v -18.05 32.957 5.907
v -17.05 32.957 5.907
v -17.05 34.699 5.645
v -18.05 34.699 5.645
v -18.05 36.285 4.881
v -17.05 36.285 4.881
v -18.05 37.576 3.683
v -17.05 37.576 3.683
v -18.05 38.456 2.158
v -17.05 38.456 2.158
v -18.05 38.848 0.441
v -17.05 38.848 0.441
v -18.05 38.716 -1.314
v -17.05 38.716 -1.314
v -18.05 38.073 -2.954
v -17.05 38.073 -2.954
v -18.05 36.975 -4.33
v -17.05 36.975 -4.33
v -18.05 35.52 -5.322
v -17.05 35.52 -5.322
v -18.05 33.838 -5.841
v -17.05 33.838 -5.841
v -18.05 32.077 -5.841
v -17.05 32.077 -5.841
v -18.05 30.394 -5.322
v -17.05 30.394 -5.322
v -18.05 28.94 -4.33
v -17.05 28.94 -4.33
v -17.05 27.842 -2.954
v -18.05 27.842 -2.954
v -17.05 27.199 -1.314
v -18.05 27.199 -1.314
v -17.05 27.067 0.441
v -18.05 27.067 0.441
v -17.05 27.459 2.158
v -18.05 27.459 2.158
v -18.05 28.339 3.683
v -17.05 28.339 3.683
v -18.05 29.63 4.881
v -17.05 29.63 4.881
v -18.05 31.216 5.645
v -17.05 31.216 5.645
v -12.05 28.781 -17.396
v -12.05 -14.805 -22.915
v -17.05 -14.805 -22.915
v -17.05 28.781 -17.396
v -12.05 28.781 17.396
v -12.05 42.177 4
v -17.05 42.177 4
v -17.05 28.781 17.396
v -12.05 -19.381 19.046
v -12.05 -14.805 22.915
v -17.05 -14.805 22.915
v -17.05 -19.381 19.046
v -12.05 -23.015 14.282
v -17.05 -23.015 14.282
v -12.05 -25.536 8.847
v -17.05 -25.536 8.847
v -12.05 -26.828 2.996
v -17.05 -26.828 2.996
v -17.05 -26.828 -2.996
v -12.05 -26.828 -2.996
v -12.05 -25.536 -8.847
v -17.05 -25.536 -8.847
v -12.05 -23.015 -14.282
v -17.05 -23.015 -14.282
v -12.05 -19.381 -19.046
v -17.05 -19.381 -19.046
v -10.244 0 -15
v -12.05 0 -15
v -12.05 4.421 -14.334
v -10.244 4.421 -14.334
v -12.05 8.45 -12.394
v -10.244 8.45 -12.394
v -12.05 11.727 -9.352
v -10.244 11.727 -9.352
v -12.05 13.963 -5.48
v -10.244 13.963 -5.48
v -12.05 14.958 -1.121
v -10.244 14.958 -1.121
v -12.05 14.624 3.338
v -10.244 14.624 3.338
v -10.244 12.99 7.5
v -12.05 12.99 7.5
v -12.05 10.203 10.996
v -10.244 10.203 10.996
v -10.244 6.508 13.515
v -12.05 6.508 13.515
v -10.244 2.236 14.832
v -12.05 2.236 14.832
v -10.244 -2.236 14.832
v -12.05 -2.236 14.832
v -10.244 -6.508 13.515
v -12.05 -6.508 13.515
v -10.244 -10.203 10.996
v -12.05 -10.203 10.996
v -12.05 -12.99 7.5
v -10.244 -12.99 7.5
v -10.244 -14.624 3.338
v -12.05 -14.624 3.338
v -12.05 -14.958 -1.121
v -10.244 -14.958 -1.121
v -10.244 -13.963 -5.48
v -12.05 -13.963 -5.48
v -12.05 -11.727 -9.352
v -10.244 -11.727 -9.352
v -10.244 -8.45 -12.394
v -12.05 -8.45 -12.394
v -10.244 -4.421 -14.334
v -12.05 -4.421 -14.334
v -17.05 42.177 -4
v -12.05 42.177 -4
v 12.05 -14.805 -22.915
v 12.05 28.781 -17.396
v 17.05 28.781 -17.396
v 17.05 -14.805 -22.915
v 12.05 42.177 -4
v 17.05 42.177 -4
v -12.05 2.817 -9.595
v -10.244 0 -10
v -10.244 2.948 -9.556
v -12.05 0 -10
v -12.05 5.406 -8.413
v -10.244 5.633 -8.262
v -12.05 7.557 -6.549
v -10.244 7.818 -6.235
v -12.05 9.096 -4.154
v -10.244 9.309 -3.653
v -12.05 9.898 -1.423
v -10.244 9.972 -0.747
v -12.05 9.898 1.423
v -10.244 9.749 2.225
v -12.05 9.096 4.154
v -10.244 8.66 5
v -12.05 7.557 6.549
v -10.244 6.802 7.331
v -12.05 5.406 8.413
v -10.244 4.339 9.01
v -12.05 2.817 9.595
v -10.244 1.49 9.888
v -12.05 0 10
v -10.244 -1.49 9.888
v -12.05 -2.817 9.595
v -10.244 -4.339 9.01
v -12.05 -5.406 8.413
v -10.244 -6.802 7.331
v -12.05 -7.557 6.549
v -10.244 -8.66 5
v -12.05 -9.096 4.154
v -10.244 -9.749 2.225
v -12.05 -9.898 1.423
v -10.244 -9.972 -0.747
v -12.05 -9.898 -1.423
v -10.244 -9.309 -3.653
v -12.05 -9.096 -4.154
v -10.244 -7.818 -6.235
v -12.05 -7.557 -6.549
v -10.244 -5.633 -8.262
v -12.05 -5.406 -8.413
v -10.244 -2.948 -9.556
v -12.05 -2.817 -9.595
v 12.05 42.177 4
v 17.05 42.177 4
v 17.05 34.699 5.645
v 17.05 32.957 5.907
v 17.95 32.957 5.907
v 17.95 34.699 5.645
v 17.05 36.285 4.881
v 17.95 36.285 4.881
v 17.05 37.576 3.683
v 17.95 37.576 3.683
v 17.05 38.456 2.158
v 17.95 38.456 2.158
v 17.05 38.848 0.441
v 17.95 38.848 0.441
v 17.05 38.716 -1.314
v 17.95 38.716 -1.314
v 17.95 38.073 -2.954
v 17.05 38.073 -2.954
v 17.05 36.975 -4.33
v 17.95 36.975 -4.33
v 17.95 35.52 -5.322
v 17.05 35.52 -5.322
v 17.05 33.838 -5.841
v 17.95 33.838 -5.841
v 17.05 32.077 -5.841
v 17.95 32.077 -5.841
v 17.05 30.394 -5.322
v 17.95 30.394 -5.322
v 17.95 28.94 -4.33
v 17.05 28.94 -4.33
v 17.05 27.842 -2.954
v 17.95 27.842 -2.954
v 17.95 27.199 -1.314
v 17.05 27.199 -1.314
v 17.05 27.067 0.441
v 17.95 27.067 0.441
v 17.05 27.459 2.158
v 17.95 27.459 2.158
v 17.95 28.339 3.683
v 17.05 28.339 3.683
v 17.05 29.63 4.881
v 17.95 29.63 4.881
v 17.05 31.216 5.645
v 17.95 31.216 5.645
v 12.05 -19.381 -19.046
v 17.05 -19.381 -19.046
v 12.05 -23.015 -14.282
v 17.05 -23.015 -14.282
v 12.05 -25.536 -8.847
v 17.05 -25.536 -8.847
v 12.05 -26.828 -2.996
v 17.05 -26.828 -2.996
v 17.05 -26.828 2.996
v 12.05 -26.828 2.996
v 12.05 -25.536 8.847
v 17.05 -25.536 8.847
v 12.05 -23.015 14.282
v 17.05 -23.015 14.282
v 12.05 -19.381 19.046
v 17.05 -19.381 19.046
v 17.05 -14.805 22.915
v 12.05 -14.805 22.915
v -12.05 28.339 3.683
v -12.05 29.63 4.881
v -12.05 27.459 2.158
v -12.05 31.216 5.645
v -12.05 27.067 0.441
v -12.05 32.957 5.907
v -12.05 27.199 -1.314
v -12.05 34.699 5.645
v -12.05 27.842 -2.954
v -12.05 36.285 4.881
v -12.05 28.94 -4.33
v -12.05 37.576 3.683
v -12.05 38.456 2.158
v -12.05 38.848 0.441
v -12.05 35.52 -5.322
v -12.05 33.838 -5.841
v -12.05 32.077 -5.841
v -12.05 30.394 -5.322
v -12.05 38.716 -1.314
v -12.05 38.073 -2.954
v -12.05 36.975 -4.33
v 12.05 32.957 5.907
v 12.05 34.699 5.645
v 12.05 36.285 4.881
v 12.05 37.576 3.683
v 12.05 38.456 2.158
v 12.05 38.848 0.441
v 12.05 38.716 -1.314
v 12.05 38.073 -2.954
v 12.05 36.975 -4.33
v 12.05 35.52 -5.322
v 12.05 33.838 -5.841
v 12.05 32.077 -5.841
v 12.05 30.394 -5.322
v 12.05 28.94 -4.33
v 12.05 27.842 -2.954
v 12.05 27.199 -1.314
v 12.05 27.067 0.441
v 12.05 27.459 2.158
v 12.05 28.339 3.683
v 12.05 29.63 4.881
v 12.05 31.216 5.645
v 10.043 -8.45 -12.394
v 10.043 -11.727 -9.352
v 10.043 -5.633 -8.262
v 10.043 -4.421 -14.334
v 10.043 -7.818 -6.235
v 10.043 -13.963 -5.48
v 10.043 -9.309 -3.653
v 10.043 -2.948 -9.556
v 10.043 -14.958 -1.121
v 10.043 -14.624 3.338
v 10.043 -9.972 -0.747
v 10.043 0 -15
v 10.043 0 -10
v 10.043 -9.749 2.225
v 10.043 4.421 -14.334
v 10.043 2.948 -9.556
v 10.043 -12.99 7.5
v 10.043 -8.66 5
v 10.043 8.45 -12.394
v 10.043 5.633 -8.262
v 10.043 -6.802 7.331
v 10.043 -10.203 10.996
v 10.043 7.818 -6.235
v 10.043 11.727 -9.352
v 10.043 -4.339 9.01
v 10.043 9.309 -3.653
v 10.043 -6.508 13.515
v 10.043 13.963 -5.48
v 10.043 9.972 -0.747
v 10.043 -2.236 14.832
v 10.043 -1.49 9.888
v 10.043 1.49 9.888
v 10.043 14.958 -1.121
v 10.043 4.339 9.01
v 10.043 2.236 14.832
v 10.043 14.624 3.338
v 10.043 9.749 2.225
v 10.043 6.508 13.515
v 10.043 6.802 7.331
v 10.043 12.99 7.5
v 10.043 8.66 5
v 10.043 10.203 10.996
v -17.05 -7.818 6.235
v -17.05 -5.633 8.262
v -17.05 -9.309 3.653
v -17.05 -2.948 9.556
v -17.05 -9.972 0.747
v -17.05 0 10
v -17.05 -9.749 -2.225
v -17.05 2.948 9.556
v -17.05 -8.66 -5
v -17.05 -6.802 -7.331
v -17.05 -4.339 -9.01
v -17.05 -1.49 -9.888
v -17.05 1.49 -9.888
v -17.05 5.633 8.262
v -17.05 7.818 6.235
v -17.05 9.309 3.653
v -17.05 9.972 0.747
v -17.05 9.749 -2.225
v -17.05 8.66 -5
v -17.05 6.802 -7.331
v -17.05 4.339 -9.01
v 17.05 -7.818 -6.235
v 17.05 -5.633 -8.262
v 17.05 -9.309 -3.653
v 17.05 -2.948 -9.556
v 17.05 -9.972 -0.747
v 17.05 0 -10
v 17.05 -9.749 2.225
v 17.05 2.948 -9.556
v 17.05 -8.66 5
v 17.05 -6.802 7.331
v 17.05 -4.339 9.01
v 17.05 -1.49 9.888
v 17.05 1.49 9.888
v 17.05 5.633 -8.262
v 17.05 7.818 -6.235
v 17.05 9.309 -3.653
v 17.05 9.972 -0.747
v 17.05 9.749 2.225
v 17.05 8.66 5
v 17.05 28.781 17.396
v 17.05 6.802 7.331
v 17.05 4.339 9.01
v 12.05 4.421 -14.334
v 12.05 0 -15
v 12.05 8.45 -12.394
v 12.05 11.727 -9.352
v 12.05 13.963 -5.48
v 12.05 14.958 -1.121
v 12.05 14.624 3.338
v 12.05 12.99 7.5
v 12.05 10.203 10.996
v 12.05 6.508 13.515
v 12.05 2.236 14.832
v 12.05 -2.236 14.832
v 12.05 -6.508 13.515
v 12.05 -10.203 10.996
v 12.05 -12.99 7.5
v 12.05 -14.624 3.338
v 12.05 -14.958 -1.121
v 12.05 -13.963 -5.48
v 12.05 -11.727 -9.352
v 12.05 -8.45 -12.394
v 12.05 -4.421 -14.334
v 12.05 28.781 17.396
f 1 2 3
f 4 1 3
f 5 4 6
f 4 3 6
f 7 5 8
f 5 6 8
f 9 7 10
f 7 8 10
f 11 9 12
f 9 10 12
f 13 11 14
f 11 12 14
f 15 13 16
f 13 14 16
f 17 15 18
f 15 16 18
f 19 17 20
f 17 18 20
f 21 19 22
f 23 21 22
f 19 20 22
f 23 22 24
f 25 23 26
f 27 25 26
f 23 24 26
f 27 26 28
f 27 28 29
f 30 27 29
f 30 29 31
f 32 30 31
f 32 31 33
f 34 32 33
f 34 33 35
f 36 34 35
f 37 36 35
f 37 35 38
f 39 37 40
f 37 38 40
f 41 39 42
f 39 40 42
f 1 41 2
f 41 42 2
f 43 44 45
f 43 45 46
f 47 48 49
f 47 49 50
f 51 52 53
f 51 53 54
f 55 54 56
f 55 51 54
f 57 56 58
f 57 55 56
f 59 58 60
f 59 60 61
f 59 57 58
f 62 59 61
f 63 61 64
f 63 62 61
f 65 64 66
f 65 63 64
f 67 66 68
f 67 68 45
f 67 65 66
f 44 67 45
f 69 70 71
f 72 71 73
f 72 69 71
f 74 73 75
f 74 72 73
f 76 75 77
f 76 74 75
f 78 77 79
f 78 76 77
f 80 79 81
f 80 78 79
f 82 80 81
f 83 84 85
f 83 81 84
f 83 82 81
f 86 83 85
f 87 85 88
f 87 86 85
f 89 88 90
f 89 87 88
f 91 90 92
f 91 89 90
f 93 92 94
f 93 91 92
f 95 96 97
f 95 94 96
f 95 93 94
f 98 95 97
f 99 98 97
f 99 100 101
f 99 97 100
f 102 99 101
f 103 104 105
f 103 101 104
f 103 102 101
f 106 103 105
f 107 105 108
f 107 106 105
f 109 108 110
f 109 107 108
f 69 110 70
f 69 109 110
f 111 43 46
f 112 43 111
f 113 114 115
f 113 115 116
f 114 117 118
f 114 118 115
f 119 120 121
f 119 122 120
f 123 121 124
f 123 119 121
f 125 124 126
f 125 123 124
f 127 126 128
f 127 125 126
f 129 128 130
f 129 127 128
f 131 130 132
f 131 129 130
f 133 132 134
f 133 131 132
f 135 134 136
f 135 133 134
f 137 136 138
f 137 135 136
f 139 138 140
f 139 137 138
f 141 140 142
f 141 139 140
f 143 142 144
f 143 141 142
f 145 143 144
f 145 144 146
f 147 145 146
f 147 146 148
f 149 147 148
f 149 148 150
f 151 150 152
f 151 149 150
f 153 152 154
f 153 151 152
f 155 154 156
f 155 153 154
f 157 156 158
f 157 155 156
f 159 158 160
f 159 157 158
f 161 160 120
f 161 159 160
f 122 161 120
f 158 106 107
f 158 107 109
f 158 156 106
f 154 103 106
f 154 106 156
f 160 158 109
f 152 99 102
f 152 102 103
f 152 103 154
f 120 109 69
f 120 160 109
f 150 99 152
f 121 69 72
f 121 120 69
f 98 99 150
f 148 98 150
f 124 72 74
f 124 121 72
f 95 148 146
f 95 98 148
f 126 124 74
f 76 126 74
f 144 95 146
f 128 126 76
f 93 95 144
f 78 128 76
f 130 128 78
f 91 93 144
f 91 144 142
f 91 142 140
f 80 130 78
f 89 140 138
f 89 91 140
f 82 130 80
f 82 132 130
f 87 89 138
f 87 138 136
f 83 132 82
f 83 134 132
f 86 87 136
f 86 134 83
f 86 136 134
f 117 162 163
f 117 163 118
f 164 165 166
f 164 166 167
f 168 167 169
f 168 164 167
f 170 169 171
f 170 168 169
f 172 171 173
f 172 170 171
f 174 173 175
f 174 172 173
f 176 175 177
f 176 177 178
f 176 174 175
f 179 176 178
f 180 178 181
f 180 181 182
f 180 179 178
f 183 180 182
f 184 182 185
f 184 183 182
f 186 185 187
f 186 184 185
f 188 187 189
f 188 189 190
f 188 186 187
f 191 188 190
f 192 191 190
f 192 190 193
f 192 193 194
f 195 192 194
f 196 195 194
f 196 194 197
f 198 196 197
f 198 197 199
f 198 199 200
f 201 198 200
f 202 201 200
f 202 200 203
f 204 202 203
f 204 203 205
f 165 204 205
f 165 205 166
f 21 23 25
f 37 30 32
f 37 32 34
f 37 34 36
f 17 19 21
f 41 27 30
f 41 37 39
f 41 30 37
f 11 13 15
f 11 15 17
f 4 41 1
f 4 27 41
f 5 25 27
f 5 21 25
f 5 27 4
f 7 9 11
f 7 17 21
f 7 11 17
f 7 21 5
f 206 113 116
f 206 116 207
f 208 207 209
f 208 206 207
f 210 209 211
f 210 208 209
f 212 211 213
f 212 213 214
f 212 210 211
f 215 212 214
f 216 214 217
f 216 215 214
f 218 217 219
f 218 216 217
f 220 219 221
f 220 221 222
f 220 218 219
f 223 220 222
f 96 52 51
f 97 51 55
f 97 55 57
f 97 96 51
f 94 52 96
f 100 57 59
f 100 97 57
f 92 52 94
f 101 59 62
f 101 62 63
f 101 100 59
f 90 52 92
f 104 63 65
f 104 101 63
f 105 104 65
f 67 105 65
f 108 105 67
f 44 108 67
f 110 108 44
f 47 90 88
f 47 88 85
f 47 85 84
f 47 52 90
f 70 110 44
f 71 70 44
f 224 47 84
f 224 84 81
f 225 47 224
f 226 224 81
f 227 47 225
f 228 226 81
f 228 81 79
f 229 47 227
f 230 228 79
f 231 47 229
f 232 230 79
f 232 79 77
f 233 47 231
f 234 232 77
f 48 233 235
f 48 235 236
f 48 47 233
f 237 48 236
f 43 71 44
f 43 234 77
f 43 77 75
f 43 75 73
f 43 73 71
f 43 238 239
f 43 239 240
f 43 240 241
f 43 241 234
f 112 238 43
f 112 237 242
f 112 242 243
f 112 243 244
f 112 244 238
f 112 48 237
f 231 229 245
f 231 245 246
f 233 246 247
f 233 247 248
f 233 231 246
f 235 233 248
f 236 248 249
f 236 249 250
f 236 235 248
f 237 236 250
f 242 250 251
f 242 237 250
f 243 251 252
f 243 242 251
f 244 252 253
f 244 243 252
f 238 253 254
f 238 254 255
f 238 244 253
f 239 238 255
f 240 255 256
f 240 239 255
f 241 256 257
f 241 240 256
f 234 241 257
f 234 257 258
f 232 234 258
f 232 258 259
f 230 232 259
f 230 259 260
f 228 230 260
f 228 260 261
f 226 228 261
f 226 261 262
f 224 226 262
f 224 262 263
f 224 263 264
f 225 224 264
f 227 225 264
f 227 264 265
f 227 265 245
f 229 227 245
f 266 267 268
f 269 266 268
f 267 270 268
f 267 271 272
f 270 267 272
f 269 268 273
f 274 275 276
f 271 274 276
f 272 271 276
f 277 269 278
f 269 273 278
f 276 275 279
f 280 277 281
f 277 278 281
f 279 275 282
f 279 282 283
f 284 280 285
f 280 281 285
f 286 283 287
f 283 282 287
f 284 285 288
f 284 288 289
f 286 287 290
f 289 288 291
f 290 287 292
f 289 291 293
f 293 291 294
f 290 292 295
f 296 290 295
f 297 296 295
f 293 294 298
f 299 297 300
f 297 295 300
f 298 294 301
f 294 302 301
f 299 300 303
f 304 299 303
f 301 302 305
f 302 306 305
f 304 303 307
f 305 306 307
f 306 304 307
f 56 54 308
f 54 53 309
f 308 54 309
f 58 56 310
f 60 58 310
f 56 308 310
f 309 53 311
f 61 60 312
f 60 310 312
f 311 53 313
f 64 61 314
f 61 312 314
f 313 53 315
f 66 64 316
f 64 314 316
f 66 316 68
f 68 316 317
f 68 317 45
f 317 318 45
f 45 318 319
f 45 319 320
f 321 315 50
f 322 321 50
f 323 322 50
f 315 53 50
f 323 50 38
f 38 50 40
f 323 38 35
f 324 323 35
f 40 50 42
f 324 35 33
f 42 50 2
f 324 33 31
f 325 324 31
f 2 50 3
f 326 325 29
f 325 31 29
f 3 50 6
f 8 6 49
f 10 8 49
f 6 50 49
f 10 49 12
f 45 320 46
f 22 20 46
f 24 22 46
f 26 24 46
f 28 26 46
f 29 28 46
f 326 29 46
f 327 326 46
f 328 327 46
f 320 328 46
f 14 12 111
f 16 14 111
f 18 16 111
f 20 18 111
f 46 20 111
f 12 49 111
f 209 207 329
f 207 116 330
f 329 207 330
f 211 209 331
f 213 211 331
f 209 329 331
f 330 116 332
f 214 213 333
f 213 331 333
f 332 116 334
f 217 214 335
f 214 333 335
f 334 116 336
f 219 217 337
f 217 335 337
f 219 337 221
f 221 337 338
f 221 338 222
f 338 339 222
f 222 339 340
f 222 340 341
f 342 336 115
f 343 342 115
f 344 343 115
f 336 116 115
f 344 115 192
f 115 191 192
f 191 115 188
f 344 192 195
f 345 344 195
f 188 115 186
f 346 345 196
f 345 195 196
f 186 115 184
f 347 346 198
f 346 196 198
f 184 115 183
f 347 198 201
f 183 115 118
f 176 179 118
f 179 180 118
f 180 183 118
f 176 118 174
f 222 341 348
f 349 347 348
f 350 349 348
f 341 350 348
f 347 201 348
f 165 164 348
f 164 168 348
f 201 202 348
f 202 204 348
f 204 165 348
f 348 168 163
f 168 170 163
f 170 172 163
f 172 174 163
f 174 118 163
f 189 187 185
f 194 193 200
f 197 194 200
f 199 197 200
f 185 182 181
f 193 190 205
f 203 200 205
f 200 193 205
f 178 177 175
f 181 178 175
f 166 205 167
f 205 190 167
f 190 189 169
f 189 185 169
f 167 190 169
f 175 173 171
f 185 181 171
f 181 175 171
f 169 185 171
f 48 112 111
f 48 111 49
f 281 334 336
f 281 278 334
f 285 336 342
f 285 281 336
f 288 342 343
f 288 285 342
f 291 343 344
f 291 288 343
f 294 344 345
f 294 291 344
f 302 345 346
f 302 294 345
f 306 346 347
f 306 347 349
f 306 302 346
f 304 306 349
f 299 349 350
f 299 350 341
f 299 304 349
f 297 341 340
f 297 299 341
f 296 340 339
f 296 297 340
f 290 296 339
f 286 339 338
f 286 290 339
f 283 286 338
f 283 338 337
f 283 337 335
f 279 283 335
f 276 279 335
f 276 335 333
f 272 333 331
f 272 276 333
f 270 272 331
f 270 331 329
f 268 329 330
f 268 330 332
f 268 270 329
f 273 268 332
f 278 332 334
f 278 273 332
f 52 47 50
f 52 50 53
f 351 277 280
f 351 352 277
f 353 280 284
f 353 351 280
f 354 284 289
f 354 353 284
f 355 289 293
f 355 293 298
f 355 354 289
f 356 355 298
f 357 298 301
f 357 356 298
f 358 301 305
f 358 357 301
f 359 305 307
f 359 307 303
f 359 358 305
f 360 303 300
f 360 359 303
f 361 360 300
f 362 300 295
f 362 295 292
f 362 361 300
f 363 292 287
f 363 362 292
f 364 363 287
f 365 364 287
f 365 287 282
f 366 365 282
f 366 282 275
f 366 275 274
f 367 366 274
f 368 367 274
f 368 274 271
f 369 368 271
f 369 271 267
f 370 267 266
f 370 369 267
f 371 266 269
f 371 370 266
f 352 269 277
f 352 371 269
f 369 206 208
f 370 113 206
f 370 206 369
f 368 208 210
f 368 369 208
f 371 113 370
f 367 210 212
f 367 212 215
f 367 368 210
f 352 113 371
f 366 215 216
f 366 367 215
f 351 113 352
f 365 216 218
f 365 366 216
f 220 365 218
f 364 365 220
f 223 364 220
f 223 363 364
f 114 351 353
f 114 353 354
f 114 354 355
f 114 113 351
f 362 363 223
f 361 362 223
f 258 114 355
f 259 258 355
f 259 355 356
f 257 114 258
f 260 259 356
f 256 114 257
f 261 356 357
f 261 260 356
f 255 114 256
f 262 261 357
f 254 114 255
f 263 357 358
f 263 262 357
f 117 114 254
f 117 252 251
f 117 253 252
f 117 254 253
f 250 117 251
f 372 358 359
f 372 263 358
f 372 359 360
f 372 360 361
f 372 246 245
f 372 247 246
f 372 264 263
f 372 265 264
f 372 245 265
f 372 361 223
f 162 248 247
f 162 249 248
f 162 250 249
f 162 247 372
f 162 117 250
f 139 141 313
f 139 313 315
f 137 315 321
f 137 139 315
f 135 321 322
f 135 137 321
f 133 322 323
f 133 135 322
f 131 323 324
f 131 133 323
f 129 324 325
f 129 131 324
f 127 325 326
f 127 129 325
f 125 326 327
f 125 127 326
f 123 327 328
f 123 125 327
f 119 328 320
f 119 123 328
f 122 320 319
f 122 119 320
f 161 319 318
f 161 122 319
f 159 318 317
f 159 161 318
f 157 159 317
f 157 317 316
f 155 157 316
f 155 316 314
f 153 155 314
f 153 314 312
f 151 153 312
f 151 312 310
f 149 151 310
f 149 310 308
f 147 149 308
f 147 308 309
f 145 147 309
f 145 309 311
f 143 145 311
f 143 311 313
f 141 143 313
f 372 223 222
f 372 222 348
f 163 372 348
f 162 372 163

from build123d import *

# Parameters (mm, degrees)
IZIM2_R                          = 15
IZIM2_R_2                        = 10
Y_KSEKLIK_EKSTR_ZYON1_DEPTH      = 12.05
IZIM3_R                          = 10
Y_KSEKLIK_EKSTR_ZYON2_DEPTH      = 5
IZIM4_R                          = 15
Y_KSEKLIK_EKSTR_ZYON3_DEPTH      = 5
IZIM7_R                          = 15
IZIM7_R_2                        = 10
Y_KSEKLIK_EKSTR_ZYON4_DEPTH      = 5
IZIM5_R                          = 5.907014981
Y_KSEKLIK_EKSTR_ZYON5_DEPTH      = 1
Y_KSEKLIK_EKSTR_ZYON5_DEPTH_BACK = 35
SKETCH1_W                        = 20.286238667
SKETCH1_H                        = 40.774330455
CUT_EXTRUDE1_DEPTH               = 110


with BuildPart() as part:
    # Çizim2 → Yükseklik-Ekstrüzyon1 (new body, symmetric)
    with BuildSketch(Plane(origin=(0, 0, 0), x_dir=(0, 0, -1), z_dir=(1, 0, 0))):
        Circle(IZIM2_R)
        Circle(IZIM2_R_2, mode=Mode.SUBTRACT)
    extrude(amount=Y_KSEKLIK_EKSTR_ZYON1_DEPTH, both=True)

    # Çizim3 → Yükseklik-Ekstrüzyon2 (add)
    with BuildSketch(Plane(origin=(12.05, 0, 0), x_dir=(0, 0, -1), z_dir=(1, 0, 0))):
        with BuildLine():
            Line((-4, 42.176870951), (4, 42.176870951))
            Line((4, 42.176870951), (17.395555059, 28.781315891))
            Line((17.395555059, 28.781315891), (22.914530919, -14.80525669))
            ThreePointArc((22.914530919, -14.80525669), (0, -26.990652818), (-22.914530919, -14.80525669))
            Line((-22.914530919, -14.80525669), (-17.395555059, 28.781315891))
            Line((-17.395555059, 28.781315891), (-4, 42.176870951))
        make_face()
        Circle(IZIM3_R, mode=Mode.SUBTRACT)
    extrude(amount=Y_KSEKLIK_EKSTR_ZYON2_DEPTH)



with BuildPart() as body_2:
    # Çizim4 → Yükseklik-Ekstrüzyon3 (new body)
    with BuildSketch(Plane.ZY.offset(12.05)):
        with BuildLine():
            Line((-4, 42.176870951), (4, 42.176870951))
            Line((4, 42.176870951), (17.395555059, 28.781315891))
            Line((17.395555059, 28.781315891), (22.914530919, -14.80525669))
            ThreePointArc((22.914530919, -14.80525669), (0, -26.990652818), (-22.914530919, -14.80525669))
            Line((-22.914530919, -14.80525669), (-17.395555059, 28.781315891))
            Line((-17.395555059, 28.781315891), (-4, 42.176870951))
        make_face()
        Circle(IZIM4_R, mode=Mode.SUBTRACT)
    extrude(amount=Y_KSEKLIK_EKSTR_ZYON3_DEPTH)


with BuildPart() as part_1:
    add(part.part)

    add(body_2.part)  # Yükseklik-Ekstrüzyon4 merges body 2
    # Çizim7 → Yükseklik-Ekstrüzyon4 (add)
    with BuildSketch(Plane.ZY.offset(12.05)):
        Circle(IZIM7_R)
        Circle(IZIM7_R_2, mode=Mode.SUBTRACT)
    extrude(amount=Y_KSEKLIK_EKSTR_ZYON4_DEPTH)

    # Çizim5 → Yükseklik-Ekstrüzyon5 (add, two sides)
    with BuildSketch(Plane.ZY.offset(17.05)) as y_kseklik_ekstr_zyon5_sk:
        with Locations((0, 32.957419359)):
            Circle(IZIM5_R)
    extrude(amount=Y_KSEKLIK_EKSTR_ZYON5_DEPTH)
    extrude(y_kseklik_ekstr_zyon5_sk.sketch, amount=-Y_KSEKLIK_EKSTR_ZYON5_DEPTH_BACK)

    # Sketch1 → Cut-Extrude1 (cut)
    with BuildSketch(Plane.XY.offset(68.760639517)):
        with Locations((-0.100463281, -3.811592274)):
            Rectangle(SKETCH1_W, SKETCH1_H)
    extrude(amount=-CUT_EXTRUDE1_DEPTH, mode=Mode.SUBTRACT)


solid = part_1.part
